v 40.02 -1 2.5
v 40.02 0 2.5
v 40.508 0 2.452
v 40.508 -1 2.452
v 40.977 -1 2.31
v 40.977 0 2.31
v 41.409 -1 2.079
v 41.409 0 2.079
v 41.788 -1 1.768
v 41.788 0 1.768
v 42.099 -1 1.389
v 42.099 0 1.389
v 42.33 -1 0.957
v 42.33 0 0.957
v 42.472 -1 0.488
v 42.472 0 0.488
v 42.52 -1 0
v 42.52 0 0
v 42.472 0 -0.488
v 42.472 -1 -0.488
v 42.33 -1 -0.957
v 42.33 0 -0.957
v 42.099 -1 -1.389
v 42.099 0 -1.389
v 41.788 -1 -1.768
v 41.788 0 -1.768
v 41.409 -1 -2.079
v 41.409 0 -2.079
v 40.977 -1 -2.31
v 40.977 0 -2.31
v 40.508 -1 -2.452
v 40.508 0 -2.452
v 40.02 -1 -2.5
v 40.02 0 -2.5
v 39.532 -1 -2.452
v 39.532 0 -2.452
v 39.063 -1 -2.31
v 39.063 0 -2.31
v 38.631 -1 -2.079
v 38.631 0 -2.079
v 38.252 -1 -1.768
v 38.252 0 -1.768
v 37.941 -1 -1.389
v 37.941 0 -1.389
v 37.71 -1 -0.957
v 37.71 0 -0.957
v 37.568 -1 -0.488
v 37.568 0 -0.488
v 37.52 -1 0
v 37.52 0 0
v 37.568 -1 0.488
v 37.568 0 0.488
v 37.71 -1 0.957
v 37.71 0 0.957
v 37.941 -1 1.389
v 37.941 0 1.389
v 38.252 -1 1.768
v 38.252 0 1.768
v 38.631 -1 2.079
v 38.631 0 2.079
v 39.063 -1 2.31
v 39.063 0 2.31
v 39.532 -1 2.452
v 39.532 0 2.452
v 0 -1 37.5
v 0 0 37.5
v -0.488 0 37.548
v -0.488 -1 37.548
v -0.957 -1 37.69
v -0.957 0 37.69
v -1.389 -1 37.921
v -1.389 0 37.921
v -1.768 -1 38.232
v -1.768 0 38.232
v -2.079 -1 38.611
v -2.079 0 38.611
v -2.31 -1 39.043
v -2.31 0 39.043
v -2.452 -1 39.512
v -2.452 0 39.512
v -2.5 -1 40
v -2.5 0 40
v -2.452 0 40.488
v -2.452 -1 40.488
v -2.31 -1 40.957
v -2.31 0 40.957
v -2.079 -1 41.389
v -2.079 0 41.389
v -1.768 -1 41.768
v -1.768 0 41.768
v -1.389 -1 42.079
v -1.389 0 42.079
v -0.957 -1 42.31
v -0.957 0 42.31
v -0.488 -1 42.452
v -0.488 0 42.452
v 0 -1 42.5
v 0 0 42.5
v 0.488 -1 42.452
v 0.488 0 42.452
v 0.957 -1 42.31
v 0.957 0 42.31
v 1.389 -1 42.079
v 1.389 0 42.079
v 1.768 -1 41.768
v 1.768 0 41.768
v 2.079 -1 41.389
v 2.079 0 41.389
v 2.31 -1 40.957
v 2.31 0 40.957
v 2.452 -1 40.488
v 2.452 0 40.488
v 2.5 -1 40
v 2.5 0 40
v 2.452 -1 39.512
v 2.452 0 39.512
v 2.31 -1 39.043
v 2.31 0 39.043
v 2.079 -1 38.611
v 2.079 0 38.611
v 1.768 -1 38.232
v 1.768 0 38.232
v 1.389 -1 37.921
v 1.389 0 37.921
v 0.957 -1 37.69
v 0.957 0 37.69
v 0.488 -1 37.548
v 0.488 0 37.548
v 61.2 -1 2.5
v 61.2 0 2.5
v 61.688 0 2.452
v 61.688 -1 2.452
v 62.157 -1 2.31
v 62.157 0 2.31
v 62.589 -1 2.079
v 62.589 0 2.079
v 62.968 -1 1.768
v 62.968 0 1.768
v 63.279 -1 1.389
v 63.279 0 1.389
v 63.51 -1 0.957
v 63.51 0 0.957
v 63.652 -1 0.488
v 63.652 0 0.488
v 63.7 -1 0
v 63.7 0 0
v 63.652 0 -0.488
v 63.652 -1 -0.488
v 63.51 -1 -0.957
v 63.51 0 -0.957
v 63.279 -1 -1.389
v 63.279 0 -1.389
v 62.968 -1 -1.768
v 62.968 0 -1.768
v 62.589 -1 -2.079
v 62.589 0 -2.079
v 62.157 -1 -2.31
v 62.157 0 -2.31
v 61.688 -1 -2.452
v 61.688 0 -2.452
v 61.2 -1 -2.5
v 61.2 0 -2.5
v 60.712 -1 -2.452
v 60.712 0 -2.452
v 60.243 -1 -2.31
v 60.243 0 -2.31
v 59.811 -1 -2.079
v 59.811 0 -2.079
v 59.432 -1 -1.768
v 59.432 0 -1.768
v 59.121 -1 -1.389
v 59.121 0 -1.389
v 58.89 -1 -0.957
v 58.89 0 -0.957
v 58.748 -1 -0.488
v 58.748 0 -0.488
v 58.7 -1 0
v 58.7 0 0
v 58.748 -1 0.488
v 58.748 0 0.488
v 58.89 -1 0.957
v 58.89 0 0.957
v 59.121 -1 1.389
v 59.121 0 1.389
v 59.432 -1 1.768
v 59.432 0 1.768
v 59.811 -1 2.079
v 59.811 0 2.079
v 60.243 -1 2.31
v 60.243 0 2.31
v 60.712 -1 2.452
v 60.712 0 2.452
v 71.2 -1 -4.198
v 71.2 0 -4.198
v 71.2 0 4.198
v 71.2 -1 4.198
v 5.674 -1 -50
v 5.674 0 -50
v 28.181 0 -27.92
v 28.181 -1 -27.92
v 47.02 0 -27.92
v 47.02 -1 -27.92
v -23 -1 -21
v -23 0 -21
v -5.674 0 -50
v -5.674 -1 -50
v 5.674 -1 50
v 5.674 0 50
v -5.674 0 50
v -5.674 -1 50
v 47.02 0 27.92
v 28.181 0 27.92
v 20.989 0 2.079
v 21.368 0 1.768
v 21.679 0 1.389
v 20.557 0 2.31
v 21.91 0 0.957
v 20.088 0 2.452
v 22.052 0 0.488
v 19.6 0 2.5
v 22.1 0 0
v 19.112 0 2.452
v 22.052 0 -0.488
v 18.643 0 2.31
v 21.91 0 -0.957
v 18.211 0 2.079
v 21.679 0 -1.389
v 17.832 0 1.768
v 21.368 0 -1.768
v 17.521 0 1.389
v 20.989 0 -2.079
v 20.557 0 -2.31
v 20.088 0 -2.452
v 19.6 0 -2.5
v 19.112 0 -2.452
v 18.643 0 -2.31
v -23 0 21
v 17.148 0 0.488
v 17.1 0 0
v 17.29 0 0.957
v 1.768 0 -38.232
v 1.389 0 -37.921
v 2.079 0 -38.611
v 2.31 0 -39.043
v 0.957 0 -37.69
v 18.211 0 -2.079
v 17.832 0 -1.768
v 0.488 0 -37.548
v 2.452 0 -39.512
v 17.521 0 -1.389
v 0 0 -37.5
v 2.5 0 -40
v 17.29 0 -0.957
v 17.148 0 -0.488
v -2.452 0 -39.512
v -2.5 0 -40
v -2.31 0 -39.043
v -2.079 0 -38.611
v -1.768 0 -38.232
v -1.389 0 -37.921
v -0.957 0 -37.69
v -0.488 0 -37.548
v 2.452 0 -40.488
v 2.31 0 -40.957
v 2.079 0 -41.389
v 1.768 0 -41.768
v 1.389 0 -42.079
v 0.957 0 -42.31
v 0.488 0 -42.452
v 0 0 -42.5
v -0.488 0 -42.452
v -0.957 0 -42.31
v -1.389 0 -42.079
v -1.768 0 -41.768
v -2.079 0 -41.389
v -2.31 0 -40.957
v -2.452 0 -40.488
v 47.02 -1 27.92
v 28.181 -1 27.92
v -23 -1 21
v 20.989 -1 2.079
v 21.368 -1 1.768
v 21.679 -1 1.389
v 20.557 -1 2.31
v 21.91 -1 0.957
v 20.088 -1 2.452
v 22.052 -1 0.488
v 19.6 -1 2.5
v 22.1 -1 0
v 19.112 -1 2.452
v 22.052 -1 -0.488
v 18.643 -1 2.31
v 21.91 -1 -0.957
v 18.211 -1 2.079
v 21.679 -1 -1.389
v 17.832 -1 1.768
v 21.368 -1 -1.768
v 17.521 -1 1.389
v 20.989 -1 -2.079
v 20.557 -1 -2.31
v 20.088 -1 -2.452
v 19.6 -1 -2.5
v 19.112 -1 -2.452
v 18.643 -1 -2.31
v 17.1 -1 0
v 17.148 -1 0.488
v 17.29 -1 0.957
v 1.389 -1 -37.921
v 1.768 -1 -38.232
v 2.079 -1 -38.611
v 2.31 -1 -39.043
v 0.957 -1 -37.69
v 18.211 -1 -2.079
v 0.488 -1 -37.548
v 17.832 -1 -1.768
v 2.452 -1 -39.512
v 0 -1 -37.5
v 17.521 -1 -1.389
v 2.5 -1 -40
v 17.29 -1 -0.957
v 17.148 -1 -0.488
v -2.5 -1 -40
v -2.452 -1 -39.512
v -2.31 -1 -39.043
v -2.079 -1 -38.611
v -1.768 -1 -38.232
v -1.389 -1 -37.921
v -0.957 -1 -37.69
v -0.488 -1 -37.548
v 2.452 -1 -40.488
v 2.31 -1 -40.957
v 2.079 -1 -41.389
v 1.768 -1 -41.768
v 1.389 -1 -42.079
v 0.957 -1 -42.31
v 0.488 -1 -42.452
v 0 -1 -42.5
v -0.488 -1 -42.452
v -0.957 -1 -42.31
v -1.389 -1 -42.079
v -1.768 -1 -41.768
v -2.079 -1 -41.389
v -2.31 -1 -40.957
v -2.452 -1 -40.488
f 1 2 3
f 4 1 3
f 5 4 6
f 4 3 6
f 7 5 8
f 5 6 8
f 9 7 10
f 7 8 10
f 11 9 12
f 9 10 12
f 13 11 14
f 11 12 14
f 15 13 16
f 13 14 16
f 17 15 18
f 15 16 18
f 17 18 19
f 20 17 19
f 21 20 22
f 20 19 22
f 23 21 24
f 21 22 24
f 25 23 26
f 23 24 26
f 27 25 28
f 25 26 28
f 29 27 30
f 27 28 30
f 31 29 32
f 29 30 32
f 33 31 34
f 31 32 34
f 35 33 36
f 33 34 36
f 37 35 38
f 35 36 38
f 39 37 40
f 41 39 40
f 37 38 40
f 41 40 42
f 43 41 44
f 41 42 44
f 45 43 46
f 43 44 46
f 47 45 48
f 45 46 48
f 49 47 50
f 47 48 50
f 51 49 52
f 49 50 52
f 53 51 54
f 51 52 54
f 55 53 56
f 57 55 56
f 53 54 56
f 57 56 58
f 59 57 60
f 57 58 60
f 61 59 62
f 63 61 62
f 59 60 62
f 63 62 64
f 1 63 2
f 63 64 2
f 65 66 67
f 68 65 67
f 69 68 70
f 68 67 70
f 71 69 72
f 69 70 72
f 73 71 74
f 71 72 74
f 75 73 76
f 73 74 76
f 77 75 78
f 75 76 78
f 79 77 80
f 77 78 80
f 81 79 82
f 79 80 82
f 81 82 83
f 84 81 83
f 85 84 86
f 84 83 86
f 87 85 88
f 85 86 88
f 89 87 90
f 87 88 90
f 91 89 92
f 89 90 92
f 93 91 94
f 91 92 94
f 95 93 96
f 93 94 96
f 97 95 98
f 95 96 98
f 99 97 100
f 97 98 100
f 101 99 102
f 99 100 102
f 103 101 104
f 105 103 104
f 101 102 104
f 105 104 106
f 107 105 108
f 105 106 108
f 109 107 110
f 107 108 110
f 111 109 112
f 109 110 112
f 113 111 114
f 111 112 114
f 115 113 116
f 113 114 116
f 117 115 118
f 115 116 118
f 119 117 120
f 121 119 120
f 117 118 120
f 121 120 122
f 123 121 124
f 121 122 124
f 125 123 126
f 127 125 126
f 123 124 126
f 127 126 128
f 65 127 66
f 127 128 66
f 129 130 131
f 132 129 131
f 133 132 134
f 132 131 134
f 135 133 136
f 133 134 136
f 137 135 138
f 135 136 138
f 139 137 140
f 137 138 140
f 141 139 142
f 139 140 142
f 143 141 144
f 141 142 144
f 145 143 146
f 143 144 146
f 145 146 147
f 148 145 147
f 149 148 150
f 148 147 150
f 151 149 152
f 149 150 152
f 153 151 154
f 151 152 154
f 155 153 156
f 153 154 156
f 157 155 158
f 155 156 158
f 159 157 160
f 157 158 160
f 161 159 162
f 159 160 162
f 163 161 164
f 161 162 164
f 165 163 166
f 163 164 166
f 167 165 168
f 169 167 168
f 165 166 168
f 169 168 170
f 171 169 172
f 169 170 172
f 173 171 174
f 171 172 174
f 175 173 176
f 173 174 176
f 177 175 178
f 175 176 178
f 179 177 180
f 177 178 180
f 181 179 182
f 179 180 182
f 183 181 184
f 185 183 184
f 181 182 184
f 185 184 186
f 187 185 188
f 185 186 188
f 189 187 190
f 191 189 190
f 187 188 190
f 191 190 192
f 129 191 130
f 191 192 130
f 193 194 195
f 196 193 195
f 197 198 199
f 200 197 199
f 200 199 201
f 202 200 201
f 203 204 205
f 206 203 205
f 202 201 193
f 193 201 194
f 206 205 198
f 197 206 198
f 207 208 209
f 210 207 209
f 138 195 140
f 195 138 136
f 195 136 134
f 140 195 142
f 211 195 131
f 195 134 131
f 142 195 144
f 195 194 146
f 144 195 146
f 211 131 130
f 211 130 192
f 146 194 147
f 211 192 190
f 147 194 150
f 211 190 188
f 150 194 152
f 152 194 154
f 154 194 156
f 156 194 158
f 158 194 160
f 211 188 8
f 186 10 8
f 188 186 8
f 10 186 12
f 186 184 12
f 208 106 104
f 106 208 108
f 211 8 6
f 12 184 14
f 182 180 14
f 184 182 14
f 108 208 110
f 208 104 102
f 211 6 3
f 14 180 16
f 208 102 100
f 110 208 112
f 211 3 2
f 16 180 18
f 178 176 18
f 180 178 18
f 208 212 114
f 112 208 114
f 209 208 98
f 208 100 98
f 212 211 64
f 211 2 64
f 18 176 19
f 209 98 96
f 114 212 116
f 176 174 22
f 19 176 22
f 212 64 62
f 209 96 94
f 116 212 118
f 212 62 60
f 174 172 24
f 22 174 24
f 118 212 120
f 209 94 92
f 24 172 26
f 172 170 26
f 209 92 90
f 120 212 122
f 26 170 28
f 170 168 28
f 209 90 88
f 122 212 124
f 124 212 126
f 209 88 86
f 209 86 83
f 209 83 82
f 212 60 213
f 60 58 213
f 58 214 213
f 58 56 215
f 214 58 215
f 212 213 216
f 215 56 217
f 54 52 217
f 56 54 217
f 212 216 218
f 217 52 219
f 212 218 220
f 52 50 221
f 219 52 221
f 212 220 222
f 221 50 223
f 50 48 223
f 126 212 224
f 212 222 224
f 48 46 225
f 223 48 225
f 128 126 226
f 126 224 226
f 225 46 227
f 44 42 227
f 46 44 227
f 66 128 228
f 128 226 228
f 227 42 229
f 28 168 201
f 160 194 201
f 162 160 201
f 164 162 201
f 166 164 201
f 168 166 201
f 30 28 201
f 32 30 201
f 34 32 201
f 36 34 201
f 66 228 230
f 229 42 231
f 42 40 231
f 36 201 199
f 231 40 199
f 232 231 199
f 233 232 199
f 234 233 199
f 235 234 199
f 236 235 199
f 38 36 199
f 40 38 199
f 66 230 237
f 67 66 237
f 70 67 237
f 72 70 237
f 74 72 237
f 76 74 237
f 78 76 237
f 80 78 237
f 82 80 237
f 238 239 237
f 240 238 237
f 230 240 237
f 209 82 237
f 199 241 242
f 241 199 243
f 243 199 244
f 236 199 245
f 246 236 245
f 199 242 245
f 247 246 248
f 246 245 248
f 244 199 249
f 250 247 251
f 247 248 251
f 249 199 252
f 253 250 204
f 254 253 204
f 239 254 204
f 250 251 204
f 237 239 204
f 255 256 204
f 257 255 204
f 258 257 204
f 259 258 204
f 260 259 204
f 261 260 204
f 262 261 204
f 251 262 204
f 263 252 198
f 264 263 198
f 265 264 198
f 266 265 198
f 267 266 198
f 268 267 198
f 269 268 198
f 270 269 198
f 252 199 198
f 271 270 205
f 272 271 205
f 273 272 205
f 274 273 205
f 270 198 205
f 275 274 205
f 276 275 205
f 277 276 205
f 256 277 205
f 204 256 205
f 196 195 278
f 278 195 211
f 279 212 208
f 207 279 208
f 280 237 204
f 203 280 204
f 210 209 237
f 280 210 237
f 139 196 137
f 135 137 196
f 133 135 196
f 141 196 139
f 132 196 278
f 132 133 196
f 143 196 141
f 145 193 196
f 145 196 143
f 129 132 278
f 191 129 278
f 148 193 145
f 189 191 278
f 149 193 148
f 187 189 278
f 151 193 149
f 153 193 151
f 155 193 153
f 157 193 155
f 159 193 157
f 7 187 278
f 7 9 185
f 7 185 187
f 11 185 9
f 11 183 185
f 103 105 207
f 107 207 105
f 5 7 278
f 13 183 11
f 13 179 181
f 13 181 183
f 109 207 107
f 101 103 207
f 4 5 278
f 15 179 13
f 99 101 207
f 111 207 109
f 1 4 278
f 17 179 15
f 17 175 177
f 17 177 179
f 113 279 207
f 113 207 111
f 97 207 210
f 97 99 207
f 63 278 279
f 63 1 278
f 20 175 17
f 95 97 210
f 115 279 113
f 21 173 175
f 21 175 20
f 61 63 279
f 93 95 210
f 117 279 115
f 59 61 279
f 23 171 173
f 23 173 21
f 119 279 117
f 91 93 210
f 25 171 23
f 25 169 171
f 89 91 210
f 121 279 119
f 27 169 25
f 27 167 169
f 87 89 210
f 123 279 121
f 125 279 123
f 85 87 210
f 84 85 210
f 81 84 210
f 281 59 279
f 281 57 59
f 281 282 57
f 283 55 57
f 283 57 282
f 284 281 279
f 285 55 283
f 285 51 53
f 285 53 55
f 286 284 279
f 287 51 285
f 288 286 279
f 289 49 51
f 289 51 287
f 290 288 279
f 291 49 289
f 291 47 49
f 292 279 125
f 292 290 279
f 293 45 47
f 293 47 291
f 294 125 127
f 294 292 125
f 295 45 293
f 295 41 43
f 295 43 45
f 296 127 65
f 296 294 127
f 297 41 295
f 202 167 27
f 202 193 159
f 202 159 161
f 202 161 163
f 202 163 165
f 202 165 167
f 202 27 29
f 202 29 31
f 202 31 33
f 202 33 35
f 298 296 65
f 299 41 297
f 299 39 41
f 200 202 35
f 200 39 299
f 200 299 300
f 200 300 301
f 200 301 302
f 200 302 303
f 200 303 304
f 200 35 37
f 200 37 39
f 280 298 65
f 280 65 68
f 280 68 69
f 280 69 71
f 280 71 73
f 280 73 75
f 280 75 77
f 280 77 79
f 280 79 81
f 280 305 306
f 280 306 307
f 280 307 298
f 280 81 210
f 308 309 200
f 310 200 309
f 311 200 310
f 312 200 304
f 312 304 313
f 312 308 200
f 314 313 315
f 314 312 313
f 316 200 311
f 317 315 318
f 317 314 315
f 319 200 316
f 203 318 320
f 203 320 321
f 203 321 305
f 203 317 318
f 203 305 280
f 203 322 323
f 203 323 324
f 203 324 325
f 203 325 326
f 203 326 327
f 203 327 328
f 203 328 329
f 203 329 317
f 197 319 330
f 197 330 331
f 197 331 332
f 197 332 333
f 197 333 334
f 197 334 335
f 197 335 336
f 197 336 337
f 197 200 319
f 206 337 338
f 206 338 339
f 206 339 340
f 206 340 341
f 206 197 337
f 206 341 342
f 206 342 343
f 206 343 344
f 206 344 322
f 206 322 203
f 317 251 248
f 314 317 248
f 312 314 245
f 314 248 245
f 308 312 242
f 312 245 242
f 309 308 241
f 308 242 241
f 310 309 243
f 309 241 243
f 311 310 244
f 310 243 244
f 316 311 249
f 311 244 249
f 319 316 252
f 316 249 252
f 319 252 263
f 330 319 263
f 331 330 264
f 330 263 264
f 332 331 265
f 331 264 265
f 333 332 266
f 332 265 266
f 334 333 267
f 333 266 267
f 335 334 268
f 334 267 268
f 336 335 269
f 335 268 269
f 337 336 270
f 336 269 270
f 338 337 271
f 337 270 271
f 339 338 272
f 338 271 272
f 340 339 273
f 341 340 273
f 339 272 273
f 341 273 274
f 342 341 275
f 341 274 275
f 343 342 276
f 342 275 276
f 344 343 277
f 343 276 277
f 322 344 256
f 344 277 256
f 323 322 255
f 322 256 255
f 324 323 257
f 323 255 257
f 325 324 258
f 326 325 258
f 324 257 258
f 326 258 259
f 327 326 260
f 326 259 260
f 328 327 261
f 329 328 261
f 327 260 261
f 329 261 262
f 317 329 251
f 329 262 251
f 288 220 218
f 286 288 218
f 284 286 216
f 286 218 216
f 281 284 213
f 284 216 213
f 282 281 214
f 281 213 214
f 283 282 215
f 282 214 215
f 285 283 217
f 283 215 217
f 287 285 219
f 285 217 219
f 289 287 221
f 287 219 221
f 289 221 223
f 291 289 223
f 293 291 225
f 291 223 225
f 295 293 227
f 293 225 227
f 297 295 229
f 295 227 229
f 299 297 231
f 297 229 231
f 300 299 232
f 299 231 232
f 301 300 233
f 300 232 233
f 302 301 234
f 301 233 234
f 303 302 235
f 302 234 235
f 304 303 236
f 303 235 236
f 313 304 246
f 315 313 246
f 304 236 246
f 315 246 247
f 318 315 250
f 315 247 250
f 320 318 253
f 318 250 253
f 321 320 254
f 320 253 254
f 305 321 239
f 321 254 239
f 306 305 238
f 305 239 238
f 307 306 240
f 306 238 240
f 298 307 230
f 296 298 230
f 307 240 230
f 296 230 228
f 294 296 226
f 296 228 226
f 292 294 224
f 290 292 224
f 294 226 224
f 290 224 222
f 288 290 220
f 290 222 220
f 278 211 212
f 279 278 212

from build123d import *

# Parameters (mm, degrees)
SKETCH1_R          = 2.5
BASE_FLANGE1_DEPTH = 1


# Sheet-metal steps are written as plain solids
with BuildPart() as part:
    # Sketch1 → Base-Flange1 (new body)
    with BuildSketch(Plane(origin=(0, 0, 0), x_dir=(1, 0, 0), z_dir=(0, 1, 0))):
        Polygon((5.674376272, 50), (28.180948875, 27.92), (47.02, 27.92), (71.2, 4.198289483), (71.2, -4.198289483), (47.02, -27.92), (28.180948875, -27.92), (5.674376272, -50), (-5.674376272, -50), (-23, -21), (-23, 21), (-5.674376272, 50), align=None)
        with Locations(Location((0, 40, 0), (0, 0, 270))):
            Circle(SKETCH1_R, mode=Mode.SUBTRACT)
        with Locations(Location((0, -40, 0), (0, 0, 90))):
            Circle(SKETCH1_R, mode=Mode.SUBTRACT)
        with Locations(Location((61.2, 0, 0), (0, 0, 270))):
            Circle(SKETCH1_R, mode=Mode.SUBTRACT)
        with Locations(Location((19.6, 0, 0), (0, 0, 270))):
            Circle(SKETCH1_R, mode=Mode.SUBTRACT)
        with Locations(Location((40.02, 0, 0), (0, 0, 270))):
            Circle(SKETCH1_R, mode=Mode.SUBTRACT)
    extrude(amount=-BASE_FLANGE1_DEPTH)


solid = part.part
